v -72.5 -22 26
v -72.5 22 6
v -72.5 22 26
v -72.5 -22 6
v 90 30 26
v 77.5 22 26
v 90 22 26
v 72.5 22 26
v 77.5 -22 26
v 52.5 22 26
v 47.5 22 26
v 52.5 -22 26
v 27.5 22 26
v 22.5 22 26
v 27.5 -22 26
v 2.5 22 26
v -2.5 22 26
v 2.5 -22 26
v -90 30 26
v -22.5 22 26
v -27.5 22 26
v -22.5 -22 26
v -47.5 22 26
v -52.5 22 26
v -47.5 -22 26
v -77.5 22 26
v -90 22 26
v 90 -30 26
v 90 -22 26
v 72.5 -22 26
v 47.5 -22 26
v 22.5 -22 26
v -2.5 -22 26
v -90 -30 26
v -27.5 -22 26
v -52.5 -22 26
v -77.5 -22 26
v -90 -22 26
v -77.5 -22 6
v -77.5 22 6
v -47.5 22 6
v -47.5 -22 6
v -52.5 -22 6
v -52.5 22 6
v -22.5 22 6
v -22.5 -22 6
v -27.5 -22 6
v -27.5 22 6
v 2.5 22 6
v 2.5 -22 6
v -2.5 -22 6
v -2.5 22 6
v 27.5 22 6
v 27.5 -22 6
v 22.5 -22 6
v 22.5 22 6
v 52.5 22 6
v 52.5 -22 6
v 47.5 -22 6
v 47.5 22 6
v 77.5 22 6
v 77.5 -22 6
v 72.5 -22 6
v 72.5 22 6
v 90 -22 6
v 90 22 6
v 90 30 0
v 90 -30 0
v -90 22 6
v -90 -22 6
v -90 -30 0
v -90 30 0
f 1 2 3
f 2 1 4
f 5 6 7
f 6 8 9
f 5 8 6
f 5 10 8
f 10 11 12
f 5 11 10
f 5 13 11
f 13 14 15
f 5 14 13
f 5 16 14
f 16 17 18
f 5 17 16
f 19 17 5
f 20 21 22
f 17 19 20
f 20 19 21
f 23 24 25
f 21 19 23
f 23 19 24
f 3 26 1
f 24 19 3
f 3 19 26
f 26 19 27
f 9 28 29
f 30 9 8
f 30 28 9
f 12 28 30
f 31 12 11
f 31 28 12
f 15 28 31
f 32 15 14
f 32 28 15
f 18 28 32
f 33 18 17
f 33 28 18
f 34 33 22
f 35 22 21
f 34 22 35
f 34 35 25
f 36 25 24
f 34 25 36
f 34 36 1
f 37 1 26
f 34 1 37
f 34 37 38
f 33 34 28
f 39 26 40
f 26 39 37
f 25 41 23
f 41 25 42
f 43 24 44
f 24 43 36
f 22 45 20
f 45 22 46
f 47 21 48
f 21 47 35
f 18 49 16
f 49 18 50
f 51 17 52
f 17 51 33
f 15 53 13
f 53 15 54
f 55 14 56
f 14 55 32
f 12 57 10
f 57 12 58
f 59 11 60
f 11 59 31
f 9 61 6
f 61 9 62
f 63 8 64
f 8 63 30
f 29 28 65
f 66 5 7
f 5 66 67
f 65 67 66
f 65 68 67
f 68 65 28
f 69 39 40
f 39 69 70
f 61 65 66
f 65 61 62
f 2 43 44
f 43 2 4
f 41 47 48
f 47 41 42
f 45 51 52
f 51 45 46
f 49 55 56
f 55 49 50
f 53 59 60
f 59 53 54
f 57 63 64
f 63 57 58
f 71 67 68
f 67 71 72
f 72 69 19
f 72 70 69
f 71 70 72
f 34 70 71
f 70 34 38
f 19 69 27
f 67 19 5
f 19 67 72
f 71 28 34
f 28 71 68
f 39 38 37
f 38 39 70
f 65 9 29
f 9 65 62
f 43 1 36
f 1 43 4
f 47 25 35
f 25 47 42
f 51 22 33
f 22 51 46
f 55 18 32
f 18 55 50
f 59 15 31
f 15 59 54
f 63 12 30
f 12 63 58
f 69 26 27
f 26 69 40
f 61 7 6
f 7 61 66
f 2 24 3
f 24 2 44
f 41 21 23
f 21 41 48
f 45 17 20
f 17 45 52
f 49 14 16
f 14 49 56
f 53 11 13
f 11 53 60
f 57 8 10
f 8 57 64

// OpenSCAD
$fn = 32;

// ----------------------------------------------------------------------
// Rib frame 180 x 60 x 26
// 7 ribs at 25 mm pitch
// ----------------------------------------------------------------------

// --- parameters (mm) ---
frame = [180, 60, 6];  // base plate size (x, y, z)
rail_w = 8;            // side rail width
ribs = 7;              // number of ribs
rib_t = 5;             // rib thickness
rib_h = 20;            // rib height above the base plate
pitch = 25;            // pitch between rib centres

// --- derived feature positions (mm) ---
span = (ribs - 1) * pitch;          // = 150   distance between the outer ribs
origin_x = -span / 2;               // = -75   X of the first rib
rib_len = frame[1] - 2 * rail_w + 2;  // = 46   rib length, 1 mm into each rail
feature_centers = [
  [origin_x + 0 * pitch, 0],
  [origin_x + 1 * pitch, 0],
  [origin_x + 2 * pitch, 0],
  [origin_x + 3 * pitch, 0],
  [origin_x + 4 * pitch, 0],
  [origin_x + 5 * pitch, 0],
  [origin_x + 6 * pitch, 0]
];   // rib centre line, drives the rib loop

// base plate, two side rails, then the ribs read straight off feature_centers
union() {
  translate([-frame[0] / 2, -frame[1] / 2, 0]) cube(frame);
  translate([-frame[0] / 2, -frame[1] / 2, 0]) cube([frame[0], rail_w, frame[2] + rib_h]);
  translate([-frame[0] / 2, frame[1] / 2 - rail_w, 0]) cube([frame[0], rail_w, frame[2] + rib_h]);
  for (centre = feature_centers)
    translate([centre[0] - rib_t / 2, centre[1] - rib_len / 2, frame[2] - 1])
      cube([rib_t, rib_len, rib_h + 1]);
}
